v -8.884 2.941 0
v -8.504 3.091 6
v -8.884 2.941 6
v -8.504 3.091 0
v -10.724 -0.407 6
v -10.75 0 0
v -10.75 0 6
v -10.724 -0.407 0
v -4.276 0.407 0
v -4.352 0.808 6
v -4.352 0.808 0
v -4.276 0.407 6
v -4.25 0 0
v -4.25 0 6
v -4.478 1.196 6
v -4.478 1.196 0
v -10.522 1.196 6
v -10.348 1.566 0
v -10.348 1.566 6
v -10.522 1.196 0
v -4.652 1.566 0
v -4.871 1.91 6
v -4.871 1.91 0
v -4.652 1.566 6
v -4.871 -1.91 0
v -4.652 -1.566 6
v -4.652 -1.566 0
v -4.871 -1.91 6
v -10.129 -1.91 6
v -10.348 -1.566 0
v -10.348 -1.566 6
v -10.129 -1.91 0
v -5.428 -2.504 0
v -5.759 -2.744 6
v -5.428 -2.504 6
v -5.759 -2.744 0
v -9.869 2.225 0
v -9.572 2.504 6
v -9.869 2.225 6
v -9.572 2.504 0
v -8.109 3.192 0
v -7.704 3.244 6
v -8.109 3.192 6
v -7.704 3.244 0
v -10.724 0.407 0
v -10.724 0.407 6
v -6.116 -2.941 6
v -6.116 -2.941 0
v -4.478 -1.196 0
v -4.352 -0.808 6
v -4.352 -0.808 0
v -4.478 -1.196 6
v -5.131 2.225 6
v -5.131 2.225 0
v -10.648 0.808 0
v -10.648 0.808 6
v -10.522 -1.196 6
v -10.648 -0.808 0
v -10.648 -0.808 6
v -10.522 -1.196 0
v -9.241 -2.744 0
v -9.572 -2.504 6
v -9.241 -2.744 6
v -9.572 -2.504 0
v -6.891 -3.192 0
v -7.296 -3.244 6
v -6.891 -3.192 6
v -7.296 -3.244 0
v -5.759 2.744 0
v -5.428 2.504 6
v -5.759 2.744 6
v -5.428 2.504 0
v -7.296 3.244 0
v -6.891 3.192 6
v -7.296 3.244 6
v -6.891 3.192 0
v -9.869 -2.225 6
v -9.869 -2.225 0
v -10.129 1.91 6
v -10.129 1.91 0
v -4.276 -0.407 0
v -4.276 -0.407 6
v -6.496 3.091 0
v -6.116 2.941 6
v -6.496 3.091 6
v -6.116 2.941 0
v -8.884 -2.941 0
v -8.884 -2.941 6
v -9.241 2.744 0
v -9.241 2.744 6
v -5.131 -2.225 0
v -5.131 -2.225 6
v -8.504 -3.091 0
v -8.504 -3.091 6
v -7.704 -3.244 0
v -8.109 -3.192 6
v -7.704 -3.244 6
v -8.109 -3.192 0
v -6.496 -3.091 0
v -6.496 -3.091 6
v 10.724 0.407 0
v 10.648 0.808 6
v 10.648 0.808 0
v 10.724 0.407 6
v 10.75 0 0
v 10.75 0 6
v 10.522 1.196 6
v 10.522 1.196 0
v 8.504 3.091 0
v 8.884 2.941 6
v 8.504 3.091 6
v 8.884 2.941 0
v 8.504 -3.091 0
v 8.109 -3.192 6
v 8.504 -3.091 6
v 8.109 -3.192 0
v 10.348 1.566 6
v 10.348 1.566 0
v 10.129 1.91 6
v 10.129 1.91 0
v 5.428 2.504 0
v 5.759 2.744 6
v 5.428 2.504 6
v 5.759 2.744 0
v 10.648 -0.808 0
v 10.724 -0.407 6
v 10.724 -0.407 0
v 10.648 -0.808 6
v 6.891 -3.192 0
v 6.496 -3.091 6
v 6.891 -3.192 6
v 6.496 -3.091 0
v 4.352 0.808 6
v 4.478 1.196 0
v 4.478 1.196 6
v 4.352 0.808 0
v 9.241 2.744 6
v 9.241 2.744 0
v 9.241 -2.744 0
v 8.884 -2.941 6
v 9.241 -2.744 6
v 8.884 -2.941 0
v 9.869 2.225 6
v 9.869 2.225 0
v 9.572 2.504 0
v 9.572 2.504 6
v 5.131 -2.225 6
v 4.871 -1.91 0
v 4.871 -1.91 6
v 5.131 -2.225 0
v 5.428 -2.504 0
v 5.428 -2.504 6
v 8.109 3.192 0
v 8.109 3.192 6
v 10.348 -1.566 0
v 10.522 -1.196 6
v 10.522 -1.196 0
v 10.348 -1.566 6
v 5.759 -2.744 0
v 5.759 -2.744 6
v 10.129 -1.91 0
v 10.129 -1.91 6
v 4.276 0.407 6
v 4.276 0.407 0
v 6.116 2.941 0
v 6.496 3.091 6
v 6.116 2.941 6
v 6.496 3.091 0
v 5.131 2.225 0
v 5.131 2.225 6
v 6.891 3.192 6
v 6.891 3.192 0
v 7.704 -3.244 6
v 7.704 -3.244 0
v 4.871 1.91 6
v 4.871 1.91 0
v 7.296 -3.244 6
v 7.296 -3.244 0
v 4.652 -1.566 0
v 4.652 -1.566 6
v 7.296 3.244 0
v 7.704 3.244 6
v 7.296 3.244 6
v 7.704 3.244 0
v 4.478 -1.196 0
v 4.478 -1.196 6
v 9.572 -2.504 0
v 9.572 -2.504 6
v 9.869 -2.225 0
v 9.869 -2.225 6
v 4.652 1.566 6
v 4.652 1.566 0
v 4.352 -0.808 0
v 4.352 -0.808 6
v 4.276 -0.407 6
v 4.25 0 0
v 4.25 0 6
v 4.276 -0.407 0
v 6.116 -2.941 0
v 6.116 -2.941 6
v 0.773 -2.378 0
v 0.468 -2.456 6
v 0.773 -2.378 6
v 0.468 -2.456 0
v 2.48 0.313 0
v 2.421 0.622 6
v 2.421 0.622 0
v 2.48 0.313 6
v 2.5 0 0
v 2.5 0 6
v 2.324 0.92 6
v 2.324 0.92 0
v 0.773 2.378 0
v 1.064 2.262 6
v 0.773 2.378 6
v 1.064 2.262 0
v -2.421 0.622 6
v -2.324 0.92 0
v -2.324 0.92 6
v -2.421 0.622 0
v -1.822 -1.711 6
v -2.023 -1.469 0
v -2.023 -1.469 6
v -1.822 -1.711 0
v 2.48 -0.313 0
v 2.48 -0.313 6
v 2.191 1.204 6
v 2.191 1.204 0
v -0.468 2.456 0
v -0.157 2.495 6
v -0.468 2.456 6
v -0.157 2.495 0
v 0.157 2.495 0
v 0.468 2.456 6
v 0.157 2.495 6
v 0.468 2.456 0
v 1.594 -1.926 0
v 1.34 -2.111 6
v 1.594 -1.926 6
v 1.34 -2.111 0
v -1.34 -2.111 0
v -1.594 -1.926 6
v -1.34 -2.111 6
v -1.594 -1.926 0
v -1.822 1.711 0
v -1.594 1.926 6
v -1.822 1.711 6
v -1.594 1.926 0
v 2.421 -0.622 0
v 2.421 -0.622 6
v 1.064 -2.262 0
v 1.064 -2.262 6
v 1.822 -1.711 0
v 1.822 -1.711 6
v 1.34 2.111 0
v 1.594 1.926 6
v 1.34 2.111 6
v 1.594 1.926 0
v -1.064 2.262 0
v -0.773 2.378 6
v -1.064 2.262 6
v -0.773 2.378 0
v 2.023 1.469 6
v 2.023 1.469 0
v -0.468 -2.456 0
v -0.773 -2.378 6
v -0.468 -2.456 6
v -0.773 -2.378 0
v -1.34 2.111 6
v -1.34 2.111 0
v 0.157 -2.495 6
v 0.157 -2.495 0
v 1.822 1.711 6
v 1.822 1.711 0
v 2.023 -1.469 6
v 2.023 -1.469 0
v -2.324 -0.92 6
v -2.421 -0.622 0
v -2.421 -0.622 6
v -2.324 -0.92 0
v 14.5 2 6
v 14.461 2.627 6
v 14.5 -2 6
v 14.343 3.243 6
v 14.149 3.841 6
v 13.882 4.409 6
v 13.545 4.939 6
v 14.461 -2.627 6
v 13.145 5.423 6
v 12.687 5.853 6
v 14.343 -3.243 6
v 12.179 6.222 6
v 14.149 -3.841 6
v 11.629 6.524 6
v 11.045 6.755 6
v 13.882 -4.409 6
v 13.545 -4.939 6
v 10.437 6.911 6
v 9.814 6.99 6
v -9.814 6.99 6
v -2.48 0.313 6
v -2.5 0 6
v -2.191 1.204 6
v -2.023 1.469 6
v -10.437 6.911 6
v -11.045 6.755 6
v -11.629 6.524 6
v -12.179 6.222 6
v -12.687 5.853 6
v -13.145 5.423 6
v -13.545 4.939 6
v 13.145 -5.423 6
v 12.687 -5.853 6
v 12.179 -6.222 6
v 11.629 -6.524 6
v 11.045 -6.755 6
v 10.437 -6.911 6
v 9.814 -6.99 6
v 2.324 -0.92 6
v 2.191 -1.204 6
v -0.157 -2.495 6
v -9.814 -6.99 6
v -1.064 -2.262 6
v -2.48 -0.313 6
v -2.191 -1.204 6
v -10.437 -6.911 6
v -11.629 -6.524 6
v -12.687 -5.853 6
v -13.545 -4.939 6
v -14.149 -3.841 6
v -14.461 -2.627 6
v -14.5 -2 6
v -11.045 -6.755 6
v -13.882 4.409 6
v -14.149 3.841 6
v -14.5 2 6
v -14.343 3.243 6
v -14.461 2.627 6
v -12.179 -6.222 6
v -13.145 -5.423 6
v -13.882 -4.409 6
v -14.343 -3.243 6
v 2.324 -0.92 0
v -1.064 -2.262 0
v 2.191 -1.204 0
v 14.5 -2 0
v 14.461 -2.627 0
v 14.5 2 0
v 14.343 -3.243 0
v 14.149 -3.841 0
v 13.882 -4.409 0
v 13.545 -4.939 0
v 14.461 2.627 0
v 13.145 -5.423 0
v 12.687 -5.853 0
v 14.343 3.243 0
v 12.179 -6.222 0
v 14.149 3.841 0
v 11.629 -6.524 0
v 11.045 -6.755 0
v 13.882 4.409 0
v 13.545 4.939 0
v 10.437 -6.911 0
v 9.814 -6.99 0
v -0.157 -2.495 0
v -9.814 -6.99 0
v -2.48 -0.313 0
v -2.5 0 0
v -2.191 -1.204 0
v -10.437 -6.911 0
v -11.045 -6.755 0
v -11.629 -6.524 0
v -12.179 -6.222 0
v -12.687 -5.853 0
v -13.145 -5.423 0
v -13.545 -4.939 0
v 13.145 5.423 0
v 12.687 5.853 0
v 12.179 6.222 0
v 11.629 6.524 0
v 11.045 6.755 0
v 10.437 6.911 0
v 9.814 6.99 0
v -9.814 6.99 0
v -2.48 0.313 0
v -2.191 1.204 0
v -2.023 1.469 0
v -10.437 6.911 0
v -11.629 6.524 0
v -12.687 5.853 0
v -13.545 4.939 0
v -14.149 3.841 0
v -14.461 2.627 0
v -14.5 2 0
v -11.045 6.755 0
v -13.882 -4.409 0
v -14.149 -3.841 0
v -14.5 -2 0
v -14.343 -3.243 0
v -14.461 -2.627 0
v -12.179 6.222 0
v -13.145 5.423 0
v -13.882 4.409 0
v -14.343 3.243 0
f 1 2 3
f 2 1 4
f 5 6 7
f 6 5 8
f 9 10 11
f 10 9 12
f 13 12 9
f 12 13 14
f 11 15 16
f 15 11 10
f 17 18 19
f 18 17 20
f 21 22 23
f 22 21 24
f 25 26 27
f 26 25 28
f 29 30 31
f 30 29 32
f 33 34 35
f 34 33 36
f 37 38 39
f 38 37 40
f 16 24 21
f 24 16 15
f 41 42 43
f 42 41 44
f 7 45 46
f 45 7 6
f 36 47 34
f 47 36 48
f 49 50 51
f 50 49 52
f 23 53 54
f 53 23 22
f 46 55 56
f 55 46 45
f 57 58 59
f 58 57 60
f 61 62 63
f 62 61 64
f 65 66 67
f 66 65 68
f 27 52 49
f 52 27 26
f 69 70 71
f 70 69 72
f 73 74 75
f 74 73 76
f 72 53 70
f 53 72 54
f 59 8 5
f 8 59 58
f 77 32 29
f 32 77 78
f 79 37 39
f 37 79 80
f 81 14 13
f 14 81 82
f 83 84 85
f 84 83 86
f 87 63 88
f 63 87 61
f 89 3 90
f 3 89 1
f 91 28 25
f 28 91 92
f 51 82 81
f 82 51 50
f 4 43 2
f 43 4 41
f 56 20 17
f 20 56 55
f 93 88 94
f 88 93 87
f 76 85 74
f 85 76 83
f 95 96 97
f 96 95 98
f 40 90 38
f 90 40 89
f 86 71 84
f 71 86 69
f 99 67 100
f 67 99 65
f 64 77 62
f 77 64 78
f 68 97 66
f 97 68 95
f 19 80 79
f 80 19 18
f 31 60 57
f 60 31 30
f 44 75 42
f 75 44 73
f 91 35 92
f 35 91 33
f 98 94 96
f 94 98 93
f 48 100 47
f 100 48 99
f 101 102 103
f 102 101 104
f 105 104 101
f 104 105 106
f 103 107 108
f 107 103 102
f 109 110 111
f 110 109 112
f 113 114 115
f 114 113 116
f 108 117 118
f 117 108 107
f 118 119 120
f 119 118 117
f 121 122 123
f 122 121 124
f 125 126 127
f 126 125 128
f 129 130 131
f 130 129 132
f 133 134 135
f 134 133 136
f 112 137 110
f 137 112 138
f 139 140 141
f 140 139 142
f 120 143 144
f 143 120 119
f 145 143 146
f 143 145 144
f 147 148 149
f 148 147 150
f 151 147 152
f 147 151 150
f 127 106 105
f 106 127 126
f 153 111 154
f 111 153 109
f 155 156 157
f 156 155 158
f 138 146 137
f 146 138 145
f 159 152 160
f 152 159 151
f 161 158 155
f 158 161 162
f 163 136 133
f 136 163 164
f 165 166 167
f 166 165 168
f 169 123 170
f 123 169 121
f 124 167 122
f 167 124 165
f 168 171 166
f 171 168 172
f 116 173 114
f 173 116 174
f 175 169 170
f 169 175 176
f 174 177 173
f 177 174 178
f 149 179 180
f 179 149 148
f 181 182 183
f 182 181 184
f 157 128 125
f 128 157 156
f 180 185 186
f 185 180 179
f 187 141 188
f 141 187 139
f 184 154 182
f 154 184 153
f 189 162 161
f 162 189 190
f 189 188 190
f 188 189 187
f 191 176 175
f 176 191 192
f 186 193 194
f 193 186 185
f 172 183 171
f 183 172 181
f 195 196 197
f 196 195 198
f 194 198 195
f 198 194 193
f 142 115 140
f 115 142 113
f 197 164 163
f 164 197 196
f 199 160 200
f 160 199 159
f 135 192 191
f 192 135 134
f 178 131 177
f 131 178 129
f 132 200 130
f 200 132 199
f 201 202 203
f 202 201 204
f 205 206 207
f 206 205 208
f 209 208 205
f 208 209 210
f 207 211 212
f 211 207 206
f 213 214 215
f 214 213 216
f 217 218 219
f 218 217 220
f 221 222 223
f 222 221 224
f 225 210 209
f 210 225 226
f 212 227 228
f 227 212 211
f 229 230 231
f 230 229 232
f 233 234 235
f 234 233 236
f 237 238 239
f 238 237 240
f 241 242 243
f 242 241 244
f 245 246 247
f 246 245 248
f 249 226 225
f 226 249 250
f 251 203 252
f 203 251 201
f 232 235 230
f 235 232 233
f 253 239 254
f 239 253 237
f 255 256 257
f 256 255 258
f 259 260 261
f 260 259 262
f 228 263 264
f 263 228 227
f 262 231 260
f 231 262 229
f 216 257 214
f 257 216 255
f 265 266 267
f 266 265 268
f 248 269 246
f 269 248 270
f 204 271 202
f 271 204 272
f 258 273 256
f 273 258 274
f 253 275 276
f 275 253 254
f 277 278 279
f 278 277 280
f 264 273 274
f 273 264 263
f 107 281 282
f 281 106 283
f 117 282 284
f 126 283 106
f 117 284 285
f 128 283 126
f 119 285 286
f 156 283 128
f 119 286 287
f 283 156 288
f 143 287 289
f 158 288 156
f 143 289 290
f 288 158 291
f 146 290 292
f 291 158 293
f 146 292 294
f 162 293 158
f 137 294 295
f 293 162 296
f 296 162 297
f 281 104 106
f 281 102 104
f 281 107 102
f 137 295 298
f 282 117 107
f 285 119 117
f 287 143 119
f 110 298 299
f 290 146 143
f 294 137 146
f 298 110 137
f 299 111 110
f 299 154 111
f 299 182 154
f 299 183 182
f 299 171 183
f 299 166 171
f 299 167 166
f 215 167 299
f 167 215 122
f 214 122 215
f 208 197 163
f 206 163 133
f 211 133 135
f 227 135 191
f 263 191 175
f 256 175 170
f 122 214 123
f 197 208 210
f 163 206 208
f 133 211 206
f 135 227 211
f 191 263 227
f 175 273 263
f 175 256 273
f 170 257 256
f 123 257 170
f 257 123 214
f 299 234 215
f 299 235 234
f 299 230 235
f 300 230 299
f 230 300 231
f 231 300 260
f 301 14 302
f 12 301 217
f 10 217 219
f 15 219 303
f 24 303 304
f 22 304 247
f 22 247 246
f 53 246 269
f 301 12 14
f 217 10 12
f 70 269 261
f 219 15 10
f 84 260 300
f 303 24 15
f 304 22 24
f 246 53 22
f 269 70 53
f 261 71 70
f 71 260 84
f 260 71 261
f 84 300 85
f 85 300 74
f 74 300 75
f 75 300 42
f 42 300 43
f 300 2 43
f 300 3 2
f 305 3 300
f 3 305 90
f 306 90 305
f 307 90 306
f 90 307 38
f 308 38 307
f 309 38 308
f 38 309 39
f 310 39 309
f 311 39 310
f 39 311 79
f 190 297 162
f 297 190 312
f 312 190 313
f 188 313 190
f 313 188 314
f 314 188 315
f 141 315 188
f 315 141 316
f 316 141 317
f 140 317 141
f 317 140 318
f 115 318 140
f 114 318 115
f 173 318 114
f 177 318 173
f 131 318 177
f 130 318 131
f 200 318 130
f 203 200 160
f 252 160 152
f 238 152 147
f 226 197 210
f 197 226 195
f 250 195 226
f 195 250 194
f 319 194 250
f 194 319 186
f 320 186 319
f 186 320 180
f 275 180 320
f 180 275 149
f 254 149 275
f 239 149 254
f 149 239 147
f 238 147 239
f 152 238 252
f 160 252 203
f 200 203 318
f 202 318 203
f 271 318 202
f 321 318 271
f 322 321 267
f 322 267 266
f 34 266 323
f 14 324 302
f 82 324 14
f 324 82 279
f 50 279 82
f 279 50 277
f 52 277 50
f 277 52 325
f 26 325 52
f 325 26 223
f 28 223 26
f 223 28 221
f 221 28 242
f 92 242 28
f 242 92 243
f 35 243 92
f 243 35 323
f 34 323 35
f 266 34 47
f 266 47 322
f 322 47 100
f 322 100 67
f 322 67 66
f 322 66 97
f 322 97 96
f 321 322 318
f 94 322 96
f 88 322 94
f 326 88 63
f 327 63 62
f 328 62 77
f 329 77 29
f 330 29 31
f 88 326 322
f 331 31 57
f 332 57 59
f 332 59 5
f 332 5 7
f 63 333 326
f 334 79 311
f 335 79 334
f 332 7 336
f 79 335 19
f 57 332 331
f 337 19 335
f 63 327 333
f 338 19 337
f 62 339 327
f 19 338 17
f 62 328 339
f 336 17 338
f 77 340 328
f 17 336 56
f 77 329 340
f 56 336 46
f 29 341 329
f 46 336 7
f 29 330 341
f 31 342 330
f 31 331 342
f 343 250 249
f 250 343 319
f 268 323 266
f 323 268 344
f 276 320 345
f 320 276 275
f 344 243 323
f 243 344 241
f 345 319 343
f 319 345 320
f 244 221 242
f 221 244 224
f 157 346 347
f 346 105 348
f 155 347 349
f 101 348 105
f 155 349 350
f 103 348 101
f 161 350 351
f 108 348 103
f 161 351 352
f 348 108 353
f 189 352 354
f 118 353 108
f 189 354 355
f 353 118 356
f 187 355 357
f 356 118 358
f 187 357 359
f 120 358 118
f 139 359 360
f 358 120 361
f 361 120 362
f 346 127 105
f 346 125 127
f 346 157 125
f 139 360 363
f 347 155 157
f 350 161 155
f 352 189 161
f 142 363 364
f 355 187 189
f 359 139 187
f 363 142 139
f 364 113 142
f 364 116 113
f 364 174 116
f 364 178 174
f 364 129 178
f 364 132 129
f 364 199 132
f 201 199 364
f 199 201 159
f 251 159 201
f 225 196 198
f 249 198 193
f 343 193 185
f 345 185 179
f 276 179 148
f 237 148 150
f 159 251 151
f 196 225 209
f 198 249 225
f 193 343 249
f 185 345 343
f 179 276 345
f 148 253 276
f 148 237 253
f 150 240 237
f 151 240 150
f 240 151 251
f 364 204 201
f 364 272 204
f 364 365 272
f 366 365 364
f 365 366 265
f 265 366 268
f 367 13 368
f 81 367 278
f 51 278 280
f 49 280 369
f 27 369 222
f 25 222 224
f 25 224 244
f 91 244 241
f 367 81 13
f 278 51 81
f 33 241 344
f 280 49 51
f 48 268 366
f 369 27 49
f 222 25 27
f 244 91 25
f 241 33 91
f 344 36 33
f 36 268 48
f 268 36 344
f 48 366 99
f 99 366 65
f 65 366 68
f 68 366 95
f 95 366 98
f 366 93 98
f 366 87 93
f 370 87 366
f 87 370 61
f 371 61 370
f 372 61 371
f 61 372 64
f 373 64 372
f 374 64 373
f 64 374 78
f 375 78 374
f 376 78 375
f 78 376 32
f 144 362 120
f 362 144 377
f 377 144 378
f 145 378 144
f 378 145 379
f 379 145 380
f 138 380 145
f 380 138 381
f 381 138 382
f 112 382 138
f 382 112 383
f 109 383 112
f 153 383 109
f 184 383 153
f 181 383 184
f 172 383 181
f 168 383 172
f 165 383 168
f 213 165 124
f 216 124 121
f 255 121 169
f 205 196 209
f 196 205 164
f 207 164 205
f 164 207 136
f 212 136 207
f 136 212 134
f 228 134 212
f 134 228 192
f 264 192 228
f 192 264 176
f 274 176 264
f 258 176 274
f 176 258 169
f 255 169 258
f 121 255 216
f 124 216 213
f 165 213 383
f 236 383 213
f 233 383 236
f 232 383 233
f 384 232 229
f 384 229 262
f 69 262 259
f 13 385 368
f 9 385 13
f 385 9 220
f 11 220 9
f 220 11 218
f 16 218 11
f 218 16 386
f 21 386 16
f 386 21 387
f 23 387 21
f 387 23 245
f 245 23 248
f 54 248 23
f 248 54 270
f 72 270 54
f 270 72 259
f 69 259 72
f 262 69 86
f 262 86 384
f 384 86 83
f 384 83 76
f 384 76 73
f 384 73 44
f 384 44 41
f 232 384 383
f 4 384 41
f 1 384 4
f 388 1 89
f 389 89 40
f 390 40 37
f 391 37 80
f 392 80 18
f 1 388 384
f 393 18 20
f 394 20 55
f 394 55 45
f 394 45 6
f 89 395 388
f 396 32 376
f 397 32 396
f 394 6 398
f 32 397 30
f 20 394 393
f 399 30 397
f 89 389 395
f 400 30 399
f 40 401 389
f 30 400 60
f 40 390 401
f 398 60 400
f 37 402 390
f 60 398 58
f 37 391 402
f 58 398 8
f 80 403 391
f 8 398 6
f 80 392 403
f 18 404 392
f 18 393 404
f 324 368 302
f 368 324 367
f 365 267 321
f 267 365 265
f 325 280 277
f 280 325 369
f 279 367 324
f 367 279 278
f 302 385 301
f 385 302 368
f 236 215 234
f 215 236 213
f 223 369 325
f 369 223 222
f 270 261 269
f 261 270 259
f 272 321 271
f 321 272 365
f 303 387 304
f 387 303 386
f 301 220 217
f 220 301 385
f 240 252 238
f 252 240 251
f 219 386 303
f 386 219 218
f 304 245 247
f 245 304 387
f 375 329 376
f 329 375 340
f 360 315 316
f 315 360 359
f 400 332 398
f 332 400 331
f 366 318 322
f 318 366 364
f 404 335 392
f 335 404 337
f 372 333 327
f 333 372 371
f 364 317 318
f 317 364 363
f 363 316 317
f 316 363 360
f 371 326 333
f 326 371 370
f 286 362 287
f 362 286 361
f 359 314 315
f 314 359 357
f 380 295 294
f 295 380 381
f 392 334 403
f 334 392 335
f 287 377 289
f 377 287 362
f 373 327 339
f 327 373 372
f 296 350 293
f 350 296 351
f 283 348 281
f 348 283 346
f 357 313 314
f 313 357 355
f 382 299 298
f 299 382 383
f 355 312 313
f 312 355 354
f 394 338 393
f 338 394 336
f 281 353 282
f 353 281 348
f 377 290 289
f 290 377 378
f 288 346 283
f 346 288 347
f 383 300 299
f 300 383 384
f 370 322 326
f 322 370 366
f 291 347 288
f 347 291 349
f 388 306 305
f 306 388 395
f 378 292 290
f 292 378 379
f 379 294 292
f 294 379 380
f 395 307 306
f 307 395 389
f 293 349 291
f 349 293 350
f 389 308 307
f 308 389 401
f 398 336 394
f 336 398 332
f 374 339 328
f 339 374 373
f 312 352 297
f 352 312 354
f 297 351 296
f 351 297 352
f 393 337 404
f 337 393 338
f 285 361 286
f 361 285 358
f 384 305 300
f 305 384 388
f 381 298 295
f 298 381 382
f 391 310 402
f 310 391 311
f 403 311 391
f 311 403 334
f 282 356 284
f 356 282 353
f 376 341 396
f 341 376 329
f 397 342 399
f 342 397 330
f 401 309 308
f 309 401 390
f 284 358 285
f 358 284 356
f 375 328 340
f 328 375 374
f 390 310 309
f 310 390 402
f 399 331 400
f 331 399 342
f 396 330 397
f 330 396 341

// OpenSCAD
$fn = 50;


difference() {
	union() {
		hull() {
			translate(v = [-9.5000000000, 2.0000000000, 0]) {
				cylinder(h = 6, r = 5);
			}
			translate(v = [9.5000000000, 2.0000000000, 0]) {
				cylinder(h = 6, r = 5);
			}
			translate(v = [-9.5000000000, -2.0000000000, 0]) {
				cylinder(h = 6, r = 5);
			}
			translate(v = [9.5000000000, -2.0000000000, 0]) {
				cylinder(h = 6, r = 5);
			}
		}
	}
	union() {
		#translate(v = [-7.5000000000, 0.0000000000, 0]) {
			cylinder(h = 6, r = 3.2500000000);
		}
		#translate(v = [7.5000000000, 0.0000000000, 0]) {
			cylinder(h = 6, r = 3.2500000000);
		}
		#translate(v = [-7.5000000000, 0.0000000000, -100.0000000000]) {
			cylinder(h = 200, r = 3.2500000000);
		}
		#translate(v = [-7.5000000000, 0.0000000000, -100.0000000000]) {
			cylinder(h = 200, r = 3.2500000000);
		}
		#translate(v = [7.5000000000, 0.0000000000, -100.0000000000]) {
			cylinder(h = 200, r = 3.2500000000);
		}
		#translate(v = [7.5000000000, 0.0000000000, -100.0000000000]) {
			cylinder(h = 200, r = 3.2500000000);
		}
		#translate(v = [-7.5000000000, 0.0000000000, 0]) {
			cylinder(h = 6, r = 1.8000000000);
		}
		#translate(v = [7.5000000000, 0.0000000000, 0]) {
			cylinder(h = 6, r = 1.8000000000);
		}
		#translate(v = [-7.5000000000, 0.0000000000, 0]) {
			cylinder(h = 6, r = 1.8000000000);
		}
		#translate(v = [7.5000000000, 0.0000000000, 0]) {
			cylinder(h = 6, r = 1.8000000000);
		}
		#translate(v = [-7.5000000000, 0.0000000000, 0]) {
			cylinder(h = 6, r = 1.8000000000);
		}
		#translate(v = [7.5000000000, 0.0000000000, 0]) {
			cylinder(h = 6, r = 1.8000000000);
		}
		#cylinder(h = 6, r = 2.5000000000);
	}
}
